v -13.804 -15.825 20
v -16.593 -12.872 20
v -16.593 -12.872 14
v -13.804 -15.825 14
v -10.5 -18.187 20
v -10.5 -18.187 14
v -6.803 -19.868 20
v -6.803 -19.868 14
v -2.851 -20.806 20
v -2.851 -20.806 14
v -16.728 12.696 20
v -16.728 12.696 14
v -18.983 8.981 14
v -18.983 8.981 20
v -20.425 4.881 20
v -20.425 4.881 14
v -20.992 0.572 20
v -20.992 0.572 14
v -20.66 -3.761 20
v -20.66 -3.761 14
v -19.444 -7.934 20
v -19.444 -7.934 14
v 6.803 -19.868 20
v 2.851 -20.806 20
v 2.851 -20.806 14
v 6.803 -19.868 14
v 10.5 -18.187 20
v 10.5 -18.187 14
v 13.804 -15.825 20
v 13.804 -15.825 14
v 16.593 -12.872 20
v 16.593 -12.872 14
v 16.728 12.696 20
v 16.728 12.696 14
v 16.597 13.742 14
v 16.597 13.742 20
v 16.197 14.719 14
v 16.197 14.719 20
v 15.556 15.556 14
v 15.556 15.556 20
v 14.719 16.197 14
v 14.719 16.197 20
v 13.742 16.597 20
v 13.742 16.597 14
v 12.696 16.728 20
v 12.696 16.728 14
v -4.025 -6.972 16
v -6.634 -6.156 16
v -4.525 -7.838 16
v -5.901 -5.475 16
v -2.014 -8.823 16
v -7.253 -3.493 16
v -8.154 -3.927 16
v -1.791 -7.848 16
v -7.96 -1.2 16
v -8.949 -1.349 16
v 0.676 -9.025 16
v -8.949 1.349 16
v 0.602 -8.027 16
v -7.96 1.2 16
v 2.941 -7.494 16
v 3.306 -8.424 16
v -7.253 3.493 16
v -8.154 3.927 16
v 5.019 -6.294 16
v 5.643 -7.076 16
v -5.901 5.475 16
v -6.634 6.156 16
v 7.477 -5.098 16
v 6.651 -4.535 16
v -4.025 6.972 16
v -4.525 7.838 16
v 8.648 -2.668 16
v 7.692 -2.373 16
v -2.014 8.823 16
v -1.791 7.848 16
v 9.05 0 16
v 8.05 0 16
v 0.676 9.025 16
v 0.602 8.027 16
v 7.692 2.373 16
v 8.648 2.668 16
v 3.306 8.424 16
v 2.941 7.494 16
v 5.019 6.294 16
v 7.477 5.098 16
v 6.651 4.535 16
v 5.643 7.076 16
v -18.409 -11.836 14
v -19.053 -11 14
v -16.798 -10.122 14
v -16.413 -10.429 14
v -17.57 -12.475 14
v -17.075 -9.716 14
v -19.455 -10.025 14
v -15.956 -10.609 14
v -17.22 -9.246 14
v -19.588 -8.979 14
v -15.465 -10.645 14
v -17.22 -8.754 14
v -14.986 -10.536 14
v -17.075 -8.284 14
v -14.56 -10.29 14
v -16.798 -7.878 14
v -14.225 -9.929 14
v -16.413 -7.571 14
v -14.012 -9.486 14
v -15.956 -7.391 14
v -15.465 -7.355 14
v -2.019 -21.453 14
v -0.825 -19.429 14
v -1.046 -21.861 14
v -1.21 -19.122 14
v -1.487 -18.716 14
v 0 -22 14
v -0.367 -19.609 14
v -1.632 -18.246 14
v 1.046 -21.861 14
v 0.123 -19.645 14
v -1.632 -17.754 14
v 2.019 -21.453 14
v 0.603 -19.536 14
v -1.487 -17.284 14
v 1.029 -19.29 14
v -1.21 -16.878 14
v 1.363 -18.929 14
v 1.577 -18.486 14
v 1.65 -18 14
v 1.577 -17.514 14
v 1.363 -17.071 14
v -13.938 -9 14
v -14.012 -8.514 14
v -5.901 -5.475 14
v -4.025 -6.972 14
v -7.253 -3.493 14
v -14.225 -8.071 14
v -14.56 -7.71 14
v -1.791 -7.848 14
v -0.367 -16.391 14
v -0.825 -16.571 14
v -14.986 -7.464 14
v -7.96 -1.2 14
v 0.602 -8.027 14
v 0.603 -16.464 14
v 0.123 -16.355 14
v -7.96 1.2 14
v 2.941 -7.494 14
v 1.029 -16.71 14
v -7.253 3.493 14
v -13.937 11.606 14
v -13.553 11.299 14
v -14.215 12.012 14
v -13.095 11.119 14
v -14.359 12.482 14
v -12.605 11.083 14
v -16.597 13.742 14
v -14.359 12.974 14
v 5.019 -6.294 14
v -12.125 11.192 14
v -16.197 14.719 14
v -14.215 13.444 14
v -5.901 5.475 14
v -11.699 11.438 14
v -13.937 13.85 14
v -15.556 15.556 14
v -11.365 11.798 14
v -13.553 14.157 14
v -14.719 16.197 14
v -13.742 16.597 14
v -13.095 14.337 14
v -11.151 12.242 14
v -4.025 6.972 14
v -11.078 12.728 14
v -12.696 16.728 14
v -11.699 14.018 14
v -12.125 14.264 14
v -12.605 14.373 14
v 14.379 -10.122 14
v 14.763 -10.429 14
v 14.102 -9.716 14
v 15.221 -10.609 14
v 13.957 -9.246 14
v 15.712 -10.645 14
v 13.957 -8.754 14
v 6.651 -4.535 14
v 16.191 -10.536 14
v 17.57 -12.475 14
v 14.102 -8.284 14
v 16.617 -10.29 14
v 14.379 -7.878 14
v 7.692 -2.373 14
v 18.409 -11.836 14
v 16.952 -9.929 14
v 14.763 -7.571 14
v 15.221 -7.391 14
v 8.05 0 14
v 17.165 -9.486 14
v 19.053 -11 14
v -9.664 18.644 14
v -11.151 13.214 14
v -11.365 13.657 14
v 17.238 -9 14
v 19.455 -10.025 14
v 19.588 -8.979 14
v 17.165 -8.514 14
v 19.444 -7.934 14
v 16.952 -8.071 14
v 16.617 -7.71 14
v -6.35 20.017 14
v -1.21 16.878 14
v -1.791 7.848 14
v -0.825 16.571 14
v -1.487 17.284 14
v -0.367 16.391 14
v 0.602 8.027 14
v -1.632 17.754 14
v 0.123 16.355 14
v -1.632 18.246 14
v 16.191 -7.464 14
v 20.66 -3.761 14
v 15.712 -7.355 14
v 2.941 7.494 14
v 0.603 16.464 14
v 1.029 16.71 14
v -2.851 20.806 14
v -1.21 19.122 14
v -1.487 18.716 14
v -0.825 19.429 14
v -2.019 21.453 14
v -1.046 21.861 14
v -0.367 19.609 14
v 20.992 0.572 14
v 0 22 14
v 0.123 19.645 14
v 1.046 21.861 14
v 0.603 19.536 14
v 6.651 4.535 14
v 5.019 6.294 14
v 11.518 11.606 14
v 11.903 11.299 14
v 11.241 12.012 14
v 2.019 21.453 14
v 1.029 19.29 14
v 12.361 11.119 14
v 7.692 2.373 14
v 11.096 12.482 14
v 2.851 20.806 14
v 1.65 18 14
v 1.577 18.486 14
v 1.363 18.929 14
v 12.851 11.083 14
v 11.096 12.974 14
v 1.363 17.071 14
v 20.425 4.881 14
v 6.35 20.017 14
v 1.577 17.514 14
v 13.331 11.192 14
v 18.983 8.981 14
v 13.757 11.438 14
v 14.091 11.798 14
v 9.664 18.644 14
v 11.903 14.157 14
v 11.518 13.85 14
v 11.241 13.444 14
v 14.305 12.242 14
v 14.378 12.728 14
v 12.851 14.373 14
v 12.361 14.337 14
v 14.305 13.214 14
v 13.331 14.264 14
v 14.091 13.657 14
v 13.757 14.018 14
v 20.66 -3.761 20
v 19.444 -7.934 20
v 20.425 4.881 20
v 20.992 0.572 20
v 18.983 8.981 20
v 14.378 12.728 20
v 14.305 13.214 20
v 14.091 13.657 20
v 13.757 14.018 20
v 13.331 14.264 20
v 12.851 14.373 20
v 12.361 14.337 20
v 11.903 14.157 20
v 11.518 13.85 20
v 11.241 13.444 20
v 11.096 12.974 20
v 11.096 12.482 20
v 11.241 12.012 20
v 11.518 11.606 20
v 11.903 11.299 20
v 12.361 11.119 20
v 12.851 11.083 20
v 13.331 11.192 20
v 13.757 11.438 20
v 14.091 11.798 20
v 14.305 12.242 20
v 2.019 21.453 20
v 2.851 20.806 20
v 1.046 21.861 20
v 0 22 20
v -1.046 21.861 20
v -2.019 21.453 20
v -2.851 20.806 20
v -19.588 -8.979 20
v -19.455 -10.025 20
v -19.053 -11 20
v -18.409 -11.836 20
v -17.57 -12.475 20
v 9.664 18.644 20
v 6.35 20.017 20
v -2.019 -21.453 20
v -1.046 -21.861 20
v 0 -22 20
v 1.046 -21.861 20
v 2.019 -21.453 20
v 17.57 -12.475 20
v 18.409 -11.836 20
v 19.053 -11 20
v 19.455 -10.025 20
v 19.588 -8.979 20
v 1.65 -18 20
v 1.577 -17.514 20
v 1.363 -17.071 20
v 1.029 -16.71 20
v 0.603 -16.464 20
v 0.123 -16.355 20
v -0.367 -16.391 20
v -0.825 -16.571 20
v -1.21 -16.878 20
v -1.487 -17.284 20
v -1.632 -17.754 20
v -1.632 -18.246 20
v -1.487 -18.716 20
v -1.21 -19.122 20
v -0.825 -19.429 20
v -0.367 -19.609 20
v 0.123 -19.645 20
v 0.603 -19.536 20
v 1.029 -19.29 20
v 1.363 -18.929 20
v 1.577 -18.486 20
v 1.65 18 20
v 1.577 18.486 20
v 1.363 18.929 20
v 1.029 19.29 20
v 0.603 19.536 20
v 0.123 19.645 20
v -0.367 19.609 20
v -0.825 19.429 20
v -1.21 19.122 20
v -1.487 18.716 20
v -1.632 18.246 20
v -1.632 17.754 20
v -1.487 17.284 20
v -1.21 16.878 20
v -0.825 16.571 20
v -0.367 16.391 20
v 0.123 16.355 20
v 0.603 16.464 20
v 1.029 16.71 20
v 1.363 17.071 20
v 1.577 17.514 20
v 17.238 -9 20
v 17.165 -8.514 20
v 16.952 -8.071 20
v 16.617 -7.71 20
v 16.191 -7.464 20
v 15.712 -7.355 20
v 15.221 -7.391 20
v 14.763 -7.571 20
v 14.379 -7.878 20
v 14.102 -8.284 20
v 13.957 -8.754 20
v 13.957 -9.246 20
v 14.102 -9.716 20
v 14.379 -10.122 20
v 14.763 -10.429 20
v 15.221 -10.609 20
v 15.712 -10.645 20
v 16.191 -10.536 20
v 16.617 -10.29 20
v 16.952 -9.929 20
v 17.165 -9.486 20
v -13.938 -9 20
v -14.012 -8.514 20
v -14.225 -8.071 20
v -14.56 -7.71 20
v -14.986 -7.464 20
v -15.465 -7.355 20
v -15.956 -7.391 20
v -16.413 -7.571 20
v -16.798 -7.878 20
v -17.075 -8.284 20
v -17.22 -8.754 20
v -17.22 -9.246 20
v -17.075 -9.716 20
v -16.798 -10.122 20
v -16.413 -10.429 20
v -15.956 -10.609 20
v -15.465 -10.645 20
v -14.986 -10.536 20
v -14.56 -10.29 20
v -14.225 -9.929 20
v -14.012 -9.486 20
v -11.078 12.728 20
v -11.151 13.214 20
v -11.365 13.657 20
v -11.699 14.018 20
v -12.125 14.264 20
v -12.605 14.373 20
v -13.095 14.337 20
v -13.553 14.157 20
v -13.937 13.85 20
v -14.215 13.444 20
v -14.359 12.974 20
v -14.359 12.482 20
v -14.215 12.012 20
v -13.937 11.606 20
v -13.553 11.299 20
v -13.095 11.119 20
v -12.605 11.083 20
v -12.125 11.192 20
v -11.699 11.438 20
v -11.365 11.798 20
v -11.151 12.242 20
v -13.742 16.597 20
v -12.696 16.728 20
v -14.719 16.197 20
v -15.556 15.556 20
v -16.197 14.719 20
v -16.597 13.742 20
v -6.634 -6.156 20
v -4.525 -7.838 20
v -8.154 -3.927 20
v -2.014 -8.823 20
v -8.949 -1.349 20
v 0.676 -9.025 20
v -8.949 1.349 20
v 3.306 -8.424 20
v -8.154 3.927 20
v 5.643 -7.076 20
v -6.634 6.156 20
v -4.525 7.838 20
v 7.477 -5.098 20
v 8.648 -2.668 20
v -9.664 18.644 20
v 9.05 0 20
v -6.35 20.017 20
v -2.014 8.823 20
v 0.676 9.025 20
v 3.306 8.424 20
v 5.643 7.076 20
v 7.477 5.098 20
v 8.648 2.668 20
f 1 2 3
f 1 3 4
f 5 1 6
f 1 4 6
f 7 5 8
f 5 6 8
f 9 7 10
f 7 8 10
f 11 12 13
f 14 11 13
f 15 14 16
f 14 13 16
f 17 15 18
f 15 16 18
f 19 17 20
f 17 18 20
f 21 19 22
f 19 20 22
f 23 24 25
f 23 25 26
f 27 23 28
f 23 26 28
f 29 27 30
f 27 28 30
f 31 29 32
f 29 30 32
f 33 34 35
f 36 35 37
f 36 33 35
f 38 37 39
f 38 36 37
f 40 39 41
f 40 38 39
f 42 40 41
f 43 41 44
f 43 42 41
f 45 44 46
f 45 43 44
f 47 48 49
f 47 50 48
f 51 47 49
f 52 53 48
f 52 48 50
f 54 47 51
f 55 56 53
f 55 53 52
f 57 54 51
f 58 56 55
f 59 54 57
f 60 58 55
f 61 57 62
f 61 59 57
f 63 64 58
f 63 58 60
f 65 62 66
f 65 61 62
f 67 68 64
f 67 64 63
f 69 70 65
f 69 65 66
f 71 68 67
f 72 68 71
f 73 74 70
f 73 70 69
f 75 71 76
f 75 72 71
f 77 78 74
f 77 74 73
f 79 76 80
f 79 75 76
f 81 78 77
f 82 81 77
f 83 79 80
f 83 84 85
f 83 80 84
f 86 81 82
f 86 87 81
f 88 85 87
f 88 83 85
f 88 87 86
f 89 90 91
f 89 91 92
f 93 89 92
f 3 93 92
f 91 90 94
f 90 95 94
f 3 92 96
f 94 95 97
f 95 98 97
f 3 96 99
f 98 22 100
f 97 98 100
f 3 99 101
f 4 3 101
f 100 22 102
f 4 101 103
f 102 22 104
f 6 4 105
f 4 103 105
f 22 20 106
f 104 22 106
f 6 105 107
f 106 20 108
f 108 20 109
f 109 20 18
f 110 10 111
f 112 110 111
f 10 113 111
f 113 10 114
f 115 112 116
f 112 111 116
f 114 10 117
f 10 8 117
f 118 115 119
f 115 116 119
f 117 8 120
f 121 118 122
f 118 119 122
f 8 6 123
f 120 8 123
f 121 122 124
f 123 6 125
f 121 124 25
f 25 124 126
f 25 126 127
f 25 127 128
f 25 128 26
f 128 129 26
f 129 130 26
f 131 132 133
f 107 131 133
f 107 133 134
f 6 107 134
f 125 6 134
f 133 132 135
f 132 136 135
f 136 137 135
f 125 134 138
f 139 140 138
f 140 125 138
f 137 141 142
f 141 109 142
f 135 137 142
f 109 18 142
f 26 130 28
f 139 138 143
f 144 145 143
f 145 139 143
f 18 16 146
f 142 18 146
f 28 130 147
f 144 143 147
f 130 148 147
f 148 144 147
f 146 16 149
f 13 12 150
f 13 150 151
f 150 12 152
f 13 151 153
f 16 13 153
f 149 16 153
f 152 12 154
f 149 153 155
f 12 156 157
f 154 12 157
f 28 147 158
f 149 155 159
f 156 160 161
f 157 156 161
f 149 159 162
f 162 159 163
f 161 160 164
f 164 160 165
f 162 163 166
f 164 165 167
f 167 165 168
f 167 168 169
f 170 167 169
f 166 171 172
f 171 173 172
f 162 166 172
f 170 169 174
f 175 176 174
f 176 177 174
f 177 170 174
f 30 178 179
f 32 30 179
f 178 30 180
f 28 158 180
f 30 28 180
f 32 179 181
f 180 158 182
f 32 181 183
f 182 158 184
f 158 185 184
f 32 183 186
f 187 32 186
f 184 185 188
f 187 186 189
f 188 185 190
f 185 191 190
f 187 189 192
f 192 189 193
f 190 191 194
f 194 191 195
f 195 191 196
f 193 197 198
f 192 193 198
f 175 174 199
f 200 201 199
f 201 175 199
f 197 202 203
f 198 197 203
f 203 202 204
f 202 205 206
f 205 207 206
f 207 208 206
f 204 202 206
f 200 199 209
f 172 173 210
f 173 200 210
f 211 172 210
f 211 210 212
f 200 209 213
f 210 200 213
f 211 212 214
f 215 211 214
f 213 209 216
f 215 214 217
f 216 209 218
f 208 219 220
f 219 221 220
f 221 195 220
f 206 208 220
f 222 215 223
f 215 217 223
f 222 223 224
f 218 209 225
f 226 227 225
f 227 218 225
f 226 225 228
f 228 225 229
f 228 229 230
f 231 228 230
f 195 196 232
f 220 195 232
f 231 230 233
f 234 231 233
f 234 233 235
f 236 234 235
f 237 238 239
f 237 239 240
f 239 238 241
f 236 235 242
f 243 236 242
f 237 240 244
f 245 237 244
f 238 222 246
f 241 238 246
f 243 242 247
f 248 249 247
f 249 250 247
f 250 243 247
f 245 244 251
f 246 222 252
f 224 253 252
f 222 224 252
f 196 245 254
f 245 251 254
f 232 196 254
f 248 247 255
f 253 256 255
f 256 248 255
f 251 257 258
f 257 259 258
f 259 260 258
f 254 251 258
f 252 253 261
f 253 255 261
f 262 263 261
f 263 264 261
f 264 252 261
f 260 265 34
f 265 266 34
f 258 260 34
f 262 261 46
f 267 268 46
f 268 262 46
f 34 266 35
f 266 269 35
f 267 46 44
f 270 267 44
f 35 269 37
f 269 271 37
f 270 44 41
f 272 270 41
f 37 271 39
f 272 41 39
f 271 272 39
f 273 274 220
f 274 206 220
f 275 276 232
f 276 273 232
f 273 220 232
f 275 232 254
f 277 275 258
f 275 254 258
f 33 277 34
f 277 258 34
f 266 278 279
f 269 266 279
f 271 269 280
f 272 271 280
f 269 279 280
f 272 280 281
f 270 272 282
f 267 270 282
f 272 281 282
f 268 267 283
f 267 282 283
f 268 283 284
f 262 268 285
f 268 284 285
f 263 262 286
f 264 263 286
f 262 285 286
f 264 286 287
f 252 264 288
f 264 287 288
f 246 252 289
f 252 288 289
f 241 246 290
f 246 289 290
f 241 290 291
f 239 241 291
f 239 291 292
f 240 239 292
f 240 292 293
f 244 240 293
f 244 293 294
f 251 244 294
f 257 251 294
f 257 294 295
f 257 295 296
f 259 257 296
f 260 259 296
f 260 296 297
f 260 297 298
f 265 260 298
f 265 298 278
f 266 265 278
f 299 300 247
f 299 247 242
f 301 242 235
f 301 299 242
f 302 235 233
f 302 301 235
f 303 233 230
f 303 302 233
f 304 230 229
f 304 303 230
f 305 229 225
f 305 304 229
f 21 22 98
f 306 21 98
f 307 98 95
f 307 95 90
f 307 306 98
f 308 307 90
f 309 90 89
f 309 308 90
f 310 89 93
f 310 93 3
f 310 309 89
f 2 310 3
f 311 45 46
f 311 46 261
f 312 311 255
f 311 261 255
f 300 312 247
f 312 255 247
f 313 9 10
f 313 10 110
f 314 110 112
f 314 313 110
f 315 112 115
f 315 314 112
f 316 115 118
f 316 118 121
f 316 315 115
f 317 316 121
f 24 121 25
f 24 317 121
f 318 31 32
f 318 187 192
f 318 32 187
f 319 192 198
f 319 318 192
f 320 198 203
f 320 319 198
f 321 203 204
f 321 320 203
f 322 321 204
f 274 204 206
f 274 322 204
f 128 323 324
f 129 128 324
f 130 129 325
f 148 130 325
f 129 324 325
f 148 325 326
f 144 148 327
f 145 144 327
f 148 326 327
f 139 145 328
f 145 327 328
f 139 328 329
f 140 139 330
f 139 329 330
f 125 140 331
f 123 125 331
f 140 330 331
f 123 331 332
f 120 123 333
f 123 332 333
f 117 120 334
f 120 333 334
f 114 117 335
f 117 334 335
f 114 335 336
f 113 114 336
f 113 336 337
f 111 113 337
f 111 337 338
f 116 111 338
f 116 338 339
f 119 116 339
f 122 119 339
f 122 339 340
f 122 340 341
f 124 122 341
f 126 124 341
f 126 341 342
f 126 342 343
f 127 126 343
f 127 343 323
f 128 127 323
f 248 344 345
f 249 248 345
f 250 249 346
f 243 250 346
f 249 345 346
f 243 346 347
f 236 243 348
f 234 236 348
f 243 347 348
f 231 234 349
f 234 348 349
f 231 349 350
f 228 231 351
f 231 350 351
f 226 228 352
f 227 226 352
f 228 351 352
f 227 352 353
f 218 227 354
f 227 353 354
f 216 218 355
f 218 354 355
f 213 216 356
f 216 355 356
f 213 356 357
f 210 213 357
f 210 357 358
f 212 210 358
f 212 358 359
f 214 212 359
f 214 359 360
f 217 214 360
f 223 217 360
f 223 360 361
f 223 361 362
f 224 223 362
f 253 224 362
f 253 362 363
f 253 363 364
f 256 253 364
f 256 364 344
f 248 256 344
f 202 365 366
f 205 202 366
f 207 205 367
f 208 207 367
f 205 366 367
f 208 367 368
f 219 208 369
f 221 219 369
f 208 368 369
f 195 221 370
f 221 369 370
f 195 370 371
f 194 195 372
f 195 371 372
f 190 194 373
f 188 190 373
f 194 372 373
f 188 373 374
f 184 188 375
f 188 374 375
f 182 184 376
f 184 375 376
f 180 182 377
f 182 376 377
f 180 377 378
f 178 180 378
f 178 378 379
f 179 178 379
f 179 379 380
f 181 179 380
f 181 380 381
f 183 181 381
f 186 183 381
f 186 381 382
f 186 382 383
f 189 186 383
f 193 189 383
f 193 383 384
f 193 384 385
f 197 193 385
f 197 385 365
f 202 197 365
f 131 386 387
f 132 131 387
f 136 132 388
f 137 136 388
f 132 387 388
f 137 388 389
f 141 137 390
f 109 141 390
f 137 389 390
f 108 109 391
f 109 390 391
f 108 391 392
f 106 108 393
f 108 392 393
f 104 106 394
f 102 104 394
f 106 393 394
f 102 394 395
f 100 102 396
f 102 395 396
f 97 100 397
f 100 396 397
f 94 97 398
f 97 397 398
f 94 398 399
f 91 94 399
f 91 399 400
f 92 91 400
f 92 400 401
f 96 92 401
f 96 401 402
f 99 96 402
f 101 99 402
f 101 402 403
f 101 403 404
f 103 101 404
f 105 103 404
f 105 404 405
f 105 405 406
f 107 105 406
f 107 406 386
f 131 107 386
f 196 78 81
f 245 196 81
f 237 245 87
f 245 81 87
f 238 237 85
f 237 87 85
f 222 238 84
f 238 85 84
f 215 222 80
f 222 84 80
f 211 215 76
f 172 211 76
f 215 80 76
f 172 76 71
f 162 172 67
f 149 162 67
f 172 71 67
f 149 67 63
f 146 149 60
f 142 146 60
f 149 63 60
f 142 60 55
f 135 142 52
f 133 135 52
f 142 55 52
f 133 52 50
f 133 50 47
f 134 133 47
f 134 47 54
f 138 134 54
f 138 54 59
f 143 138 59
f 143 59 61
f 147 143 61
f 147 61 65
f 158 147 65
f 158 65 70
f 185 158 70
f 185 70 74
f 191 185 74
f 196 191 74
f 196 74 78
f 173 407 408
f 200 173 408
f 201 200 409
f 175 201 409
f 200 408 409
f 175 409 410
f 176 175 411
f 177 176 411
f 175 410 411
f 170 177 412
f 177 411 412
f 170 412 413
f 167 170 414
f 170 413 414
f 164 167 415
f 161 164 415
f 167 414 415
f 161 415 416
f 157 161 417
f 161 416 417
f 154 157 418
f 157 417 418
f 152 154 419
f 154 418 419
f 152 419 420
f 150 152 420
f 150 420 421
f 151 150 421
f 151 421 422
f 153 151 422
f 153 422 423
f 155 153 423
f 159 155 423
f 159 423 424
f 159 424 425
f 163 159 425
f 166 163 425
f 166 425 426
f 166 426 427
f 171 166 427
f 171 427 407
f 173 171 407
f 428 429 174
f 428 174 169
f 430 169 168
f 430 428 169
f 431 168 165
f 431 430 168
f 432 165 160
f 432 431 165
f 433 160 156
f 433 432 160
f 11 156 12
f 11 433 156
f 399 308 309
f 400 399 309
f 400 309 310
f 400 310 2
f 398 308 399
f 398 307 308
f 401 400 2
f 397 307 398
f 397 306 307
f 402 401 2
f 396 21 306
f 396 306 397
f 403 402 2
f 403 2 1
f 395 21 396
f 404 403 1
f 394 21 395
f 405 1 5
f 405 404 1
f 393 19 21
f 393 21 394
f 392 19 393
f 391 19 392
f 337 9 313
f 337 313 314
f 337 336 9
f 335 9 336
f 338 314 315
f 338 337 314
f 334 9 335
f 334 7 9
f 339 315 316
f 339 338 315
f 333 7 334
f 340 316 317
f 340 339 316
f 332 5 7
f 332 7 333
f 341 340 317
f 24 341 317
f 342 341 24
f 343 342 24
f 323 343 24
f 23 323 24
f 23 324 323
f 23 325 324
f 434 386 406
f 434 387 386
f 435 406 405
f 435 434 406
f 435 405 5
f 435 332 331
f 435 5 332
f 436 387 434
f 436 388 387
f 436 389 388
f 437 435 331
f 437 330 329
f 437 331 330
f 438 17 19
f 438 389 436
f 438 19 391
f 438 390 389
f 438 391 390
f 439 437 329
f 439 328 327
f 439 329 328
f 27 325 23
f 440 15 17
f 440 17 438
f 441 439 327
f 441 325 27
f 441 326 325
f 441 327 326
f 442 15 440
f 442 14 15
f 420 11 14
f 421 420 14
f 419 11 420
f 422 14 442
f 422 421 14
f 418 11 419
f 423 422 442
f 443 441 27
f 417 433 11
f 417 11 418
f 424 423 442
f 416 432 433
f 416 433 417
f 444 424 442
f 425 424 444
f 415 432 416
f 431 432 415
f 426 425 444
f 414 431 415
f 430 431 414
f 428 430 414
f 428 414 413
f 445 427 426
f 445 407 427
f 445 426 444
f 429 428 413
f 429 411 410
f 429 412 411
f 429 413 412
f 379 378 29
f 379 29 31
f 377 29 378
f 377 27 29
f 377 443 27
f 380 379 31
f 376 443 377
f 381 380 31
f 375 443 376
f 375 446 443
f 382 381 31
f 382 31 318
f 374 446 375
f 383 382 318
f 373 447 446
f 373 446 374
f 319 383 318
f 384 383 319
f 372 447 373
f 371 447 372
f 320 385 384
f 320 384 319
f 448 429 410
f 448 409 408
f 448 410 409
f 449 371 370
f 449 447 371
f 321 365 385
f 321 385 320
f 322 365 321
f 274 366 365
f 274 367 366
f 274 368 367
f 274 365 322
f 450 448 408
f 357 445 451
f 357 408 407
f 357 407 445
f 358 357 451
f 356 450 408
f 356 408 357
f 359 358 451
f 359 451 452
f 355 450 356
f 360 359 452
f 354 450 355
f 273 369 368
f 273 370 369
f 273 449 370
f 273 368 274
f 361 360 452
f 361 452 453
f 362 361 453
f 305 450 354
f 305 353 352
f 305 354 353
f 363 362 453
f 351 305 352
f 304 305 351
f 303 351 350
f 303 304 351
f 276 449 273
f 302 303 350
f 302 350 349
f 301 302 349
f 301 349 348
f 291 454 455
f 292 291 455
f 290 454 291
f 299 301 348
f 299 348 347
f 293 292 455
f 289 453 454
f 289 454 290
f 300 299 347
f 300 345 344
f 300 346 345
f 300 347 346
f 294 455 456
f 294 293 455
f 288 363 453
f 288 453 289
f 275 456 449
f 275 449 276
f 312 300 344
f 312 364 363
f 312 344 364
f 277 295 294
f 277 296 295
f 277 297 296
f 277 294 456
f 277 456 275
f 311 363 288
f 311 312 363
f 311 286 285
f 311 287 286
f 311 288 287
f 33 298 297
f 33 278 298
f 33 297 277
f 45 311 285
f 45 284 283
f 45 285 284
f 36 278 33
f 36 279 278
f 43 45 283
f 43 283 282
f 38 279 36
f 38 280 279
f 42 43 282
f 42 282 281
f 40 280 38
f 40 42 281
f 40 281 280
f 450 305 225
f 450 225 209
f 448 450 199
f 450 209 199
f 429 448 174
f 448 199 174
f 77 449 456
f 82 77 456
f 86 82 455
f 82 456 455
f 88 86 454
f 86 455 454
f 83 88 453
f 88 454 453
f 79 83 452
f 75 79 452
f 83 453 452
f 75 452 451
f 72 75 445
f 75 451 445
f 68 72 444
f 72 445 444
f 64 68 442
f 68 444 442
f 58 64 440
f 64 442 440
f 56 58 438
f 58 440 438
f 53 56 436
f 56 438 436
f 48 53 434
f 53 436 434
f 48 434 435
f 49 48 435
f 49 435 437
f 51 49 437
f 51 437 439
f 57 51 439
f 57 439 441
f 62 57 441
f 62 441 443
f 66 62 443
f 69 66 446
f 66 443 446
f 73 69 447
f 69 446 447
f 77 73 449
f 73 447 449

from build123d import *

# Parameters (mm, degrees)
SKETCH009_R     = 21
PAD002_DEPTH    = 6
SKETCH010_R     = 4
PAD003_DEPTH    = 6
SKETCH011_R     = 1.65
POCKET007_DEPTH = 6.001
SKETCH012_R     = 9.05
POCKET008_DEPTH = 4
SKETCH013_R     = 8.05
POCKET009_DEPTH = 6.001


with BuildPart() as part:
    # Sketch009 → Pad002 (new body)
    with BuildSketch(Plane.XY):
        Circle(SKETCH009_R)
    extrude(amount=PAD002_DEPTH)

    # Sketch010 (on DatumPlane) → Pad003 (join)
    with BuildSketch(Plane.XY.offset(6)):
        with Locations((-12.727922, 12.727922)):
            Circle(SKETCH010_R)
        with Locations((0, 18)):
            Circle(SKETCH010_R)
        with Locations((12.727922, 12.727922)):
            Circle(SKETCH010_R)
        with Locations((15.588457, -9)):
            Circle(SKETCH010_R)
        with Locations((-15.588457, -9)):
            Circle(SKETCH010_R)
        with Locations((0, -18)):
            Circle(SKETCH010_R)
    extrude(amount=-PAD003_DEPTH)

    # Sketch011 (on DatumPlane) → Pocket007 (cut, through all)
    with BuildSketch(Plane.XY.offset(6)):
        with Locations((-12.727922, 12.727922)):
            Circle(SKETCH011_R)
        with Locations((0, 18)):
            Circle(SKETCH011_R)
        with Locations((12.727922, 12.727922)):
            Circle(SKETCH011_R)
        with Locations((-15.588457, -9)):
            Circle(SKETCH011_R)
        with Locations((15.588457, -9)):
            Circle(SKETCH011_R)
        with Locations((0, -18)):
            Circle(SKETCH011_R)
    extrude(amount=-POCKET007_DEPTH, mode=Mode.SUBTRACT)

    # Sketch012 (on DatumPlane) → Pocket008 (cut)
    with BuildSketch(Plane.XY.offset(6)):
        Circle(SKETCH012_R)
    extrude(amount=-POCKET008_DEPTH, mode=Mode.SUBTRACT)

    # Sketch013 (on DatumPlane) → Pocket009 (cut, through all)
    with BuildSketch(Plane.XY.offset(6)):
        Circle(SKETCH013_R)
    extrude(amount=-POCKET009_DEPTH, mode=Mode.SUBTRACT)


with BuildPart() as part_1:
    # Body001 placement: moved
    add(part.part.moved(Location((0, 0, 14))))


solid = part_1.part
